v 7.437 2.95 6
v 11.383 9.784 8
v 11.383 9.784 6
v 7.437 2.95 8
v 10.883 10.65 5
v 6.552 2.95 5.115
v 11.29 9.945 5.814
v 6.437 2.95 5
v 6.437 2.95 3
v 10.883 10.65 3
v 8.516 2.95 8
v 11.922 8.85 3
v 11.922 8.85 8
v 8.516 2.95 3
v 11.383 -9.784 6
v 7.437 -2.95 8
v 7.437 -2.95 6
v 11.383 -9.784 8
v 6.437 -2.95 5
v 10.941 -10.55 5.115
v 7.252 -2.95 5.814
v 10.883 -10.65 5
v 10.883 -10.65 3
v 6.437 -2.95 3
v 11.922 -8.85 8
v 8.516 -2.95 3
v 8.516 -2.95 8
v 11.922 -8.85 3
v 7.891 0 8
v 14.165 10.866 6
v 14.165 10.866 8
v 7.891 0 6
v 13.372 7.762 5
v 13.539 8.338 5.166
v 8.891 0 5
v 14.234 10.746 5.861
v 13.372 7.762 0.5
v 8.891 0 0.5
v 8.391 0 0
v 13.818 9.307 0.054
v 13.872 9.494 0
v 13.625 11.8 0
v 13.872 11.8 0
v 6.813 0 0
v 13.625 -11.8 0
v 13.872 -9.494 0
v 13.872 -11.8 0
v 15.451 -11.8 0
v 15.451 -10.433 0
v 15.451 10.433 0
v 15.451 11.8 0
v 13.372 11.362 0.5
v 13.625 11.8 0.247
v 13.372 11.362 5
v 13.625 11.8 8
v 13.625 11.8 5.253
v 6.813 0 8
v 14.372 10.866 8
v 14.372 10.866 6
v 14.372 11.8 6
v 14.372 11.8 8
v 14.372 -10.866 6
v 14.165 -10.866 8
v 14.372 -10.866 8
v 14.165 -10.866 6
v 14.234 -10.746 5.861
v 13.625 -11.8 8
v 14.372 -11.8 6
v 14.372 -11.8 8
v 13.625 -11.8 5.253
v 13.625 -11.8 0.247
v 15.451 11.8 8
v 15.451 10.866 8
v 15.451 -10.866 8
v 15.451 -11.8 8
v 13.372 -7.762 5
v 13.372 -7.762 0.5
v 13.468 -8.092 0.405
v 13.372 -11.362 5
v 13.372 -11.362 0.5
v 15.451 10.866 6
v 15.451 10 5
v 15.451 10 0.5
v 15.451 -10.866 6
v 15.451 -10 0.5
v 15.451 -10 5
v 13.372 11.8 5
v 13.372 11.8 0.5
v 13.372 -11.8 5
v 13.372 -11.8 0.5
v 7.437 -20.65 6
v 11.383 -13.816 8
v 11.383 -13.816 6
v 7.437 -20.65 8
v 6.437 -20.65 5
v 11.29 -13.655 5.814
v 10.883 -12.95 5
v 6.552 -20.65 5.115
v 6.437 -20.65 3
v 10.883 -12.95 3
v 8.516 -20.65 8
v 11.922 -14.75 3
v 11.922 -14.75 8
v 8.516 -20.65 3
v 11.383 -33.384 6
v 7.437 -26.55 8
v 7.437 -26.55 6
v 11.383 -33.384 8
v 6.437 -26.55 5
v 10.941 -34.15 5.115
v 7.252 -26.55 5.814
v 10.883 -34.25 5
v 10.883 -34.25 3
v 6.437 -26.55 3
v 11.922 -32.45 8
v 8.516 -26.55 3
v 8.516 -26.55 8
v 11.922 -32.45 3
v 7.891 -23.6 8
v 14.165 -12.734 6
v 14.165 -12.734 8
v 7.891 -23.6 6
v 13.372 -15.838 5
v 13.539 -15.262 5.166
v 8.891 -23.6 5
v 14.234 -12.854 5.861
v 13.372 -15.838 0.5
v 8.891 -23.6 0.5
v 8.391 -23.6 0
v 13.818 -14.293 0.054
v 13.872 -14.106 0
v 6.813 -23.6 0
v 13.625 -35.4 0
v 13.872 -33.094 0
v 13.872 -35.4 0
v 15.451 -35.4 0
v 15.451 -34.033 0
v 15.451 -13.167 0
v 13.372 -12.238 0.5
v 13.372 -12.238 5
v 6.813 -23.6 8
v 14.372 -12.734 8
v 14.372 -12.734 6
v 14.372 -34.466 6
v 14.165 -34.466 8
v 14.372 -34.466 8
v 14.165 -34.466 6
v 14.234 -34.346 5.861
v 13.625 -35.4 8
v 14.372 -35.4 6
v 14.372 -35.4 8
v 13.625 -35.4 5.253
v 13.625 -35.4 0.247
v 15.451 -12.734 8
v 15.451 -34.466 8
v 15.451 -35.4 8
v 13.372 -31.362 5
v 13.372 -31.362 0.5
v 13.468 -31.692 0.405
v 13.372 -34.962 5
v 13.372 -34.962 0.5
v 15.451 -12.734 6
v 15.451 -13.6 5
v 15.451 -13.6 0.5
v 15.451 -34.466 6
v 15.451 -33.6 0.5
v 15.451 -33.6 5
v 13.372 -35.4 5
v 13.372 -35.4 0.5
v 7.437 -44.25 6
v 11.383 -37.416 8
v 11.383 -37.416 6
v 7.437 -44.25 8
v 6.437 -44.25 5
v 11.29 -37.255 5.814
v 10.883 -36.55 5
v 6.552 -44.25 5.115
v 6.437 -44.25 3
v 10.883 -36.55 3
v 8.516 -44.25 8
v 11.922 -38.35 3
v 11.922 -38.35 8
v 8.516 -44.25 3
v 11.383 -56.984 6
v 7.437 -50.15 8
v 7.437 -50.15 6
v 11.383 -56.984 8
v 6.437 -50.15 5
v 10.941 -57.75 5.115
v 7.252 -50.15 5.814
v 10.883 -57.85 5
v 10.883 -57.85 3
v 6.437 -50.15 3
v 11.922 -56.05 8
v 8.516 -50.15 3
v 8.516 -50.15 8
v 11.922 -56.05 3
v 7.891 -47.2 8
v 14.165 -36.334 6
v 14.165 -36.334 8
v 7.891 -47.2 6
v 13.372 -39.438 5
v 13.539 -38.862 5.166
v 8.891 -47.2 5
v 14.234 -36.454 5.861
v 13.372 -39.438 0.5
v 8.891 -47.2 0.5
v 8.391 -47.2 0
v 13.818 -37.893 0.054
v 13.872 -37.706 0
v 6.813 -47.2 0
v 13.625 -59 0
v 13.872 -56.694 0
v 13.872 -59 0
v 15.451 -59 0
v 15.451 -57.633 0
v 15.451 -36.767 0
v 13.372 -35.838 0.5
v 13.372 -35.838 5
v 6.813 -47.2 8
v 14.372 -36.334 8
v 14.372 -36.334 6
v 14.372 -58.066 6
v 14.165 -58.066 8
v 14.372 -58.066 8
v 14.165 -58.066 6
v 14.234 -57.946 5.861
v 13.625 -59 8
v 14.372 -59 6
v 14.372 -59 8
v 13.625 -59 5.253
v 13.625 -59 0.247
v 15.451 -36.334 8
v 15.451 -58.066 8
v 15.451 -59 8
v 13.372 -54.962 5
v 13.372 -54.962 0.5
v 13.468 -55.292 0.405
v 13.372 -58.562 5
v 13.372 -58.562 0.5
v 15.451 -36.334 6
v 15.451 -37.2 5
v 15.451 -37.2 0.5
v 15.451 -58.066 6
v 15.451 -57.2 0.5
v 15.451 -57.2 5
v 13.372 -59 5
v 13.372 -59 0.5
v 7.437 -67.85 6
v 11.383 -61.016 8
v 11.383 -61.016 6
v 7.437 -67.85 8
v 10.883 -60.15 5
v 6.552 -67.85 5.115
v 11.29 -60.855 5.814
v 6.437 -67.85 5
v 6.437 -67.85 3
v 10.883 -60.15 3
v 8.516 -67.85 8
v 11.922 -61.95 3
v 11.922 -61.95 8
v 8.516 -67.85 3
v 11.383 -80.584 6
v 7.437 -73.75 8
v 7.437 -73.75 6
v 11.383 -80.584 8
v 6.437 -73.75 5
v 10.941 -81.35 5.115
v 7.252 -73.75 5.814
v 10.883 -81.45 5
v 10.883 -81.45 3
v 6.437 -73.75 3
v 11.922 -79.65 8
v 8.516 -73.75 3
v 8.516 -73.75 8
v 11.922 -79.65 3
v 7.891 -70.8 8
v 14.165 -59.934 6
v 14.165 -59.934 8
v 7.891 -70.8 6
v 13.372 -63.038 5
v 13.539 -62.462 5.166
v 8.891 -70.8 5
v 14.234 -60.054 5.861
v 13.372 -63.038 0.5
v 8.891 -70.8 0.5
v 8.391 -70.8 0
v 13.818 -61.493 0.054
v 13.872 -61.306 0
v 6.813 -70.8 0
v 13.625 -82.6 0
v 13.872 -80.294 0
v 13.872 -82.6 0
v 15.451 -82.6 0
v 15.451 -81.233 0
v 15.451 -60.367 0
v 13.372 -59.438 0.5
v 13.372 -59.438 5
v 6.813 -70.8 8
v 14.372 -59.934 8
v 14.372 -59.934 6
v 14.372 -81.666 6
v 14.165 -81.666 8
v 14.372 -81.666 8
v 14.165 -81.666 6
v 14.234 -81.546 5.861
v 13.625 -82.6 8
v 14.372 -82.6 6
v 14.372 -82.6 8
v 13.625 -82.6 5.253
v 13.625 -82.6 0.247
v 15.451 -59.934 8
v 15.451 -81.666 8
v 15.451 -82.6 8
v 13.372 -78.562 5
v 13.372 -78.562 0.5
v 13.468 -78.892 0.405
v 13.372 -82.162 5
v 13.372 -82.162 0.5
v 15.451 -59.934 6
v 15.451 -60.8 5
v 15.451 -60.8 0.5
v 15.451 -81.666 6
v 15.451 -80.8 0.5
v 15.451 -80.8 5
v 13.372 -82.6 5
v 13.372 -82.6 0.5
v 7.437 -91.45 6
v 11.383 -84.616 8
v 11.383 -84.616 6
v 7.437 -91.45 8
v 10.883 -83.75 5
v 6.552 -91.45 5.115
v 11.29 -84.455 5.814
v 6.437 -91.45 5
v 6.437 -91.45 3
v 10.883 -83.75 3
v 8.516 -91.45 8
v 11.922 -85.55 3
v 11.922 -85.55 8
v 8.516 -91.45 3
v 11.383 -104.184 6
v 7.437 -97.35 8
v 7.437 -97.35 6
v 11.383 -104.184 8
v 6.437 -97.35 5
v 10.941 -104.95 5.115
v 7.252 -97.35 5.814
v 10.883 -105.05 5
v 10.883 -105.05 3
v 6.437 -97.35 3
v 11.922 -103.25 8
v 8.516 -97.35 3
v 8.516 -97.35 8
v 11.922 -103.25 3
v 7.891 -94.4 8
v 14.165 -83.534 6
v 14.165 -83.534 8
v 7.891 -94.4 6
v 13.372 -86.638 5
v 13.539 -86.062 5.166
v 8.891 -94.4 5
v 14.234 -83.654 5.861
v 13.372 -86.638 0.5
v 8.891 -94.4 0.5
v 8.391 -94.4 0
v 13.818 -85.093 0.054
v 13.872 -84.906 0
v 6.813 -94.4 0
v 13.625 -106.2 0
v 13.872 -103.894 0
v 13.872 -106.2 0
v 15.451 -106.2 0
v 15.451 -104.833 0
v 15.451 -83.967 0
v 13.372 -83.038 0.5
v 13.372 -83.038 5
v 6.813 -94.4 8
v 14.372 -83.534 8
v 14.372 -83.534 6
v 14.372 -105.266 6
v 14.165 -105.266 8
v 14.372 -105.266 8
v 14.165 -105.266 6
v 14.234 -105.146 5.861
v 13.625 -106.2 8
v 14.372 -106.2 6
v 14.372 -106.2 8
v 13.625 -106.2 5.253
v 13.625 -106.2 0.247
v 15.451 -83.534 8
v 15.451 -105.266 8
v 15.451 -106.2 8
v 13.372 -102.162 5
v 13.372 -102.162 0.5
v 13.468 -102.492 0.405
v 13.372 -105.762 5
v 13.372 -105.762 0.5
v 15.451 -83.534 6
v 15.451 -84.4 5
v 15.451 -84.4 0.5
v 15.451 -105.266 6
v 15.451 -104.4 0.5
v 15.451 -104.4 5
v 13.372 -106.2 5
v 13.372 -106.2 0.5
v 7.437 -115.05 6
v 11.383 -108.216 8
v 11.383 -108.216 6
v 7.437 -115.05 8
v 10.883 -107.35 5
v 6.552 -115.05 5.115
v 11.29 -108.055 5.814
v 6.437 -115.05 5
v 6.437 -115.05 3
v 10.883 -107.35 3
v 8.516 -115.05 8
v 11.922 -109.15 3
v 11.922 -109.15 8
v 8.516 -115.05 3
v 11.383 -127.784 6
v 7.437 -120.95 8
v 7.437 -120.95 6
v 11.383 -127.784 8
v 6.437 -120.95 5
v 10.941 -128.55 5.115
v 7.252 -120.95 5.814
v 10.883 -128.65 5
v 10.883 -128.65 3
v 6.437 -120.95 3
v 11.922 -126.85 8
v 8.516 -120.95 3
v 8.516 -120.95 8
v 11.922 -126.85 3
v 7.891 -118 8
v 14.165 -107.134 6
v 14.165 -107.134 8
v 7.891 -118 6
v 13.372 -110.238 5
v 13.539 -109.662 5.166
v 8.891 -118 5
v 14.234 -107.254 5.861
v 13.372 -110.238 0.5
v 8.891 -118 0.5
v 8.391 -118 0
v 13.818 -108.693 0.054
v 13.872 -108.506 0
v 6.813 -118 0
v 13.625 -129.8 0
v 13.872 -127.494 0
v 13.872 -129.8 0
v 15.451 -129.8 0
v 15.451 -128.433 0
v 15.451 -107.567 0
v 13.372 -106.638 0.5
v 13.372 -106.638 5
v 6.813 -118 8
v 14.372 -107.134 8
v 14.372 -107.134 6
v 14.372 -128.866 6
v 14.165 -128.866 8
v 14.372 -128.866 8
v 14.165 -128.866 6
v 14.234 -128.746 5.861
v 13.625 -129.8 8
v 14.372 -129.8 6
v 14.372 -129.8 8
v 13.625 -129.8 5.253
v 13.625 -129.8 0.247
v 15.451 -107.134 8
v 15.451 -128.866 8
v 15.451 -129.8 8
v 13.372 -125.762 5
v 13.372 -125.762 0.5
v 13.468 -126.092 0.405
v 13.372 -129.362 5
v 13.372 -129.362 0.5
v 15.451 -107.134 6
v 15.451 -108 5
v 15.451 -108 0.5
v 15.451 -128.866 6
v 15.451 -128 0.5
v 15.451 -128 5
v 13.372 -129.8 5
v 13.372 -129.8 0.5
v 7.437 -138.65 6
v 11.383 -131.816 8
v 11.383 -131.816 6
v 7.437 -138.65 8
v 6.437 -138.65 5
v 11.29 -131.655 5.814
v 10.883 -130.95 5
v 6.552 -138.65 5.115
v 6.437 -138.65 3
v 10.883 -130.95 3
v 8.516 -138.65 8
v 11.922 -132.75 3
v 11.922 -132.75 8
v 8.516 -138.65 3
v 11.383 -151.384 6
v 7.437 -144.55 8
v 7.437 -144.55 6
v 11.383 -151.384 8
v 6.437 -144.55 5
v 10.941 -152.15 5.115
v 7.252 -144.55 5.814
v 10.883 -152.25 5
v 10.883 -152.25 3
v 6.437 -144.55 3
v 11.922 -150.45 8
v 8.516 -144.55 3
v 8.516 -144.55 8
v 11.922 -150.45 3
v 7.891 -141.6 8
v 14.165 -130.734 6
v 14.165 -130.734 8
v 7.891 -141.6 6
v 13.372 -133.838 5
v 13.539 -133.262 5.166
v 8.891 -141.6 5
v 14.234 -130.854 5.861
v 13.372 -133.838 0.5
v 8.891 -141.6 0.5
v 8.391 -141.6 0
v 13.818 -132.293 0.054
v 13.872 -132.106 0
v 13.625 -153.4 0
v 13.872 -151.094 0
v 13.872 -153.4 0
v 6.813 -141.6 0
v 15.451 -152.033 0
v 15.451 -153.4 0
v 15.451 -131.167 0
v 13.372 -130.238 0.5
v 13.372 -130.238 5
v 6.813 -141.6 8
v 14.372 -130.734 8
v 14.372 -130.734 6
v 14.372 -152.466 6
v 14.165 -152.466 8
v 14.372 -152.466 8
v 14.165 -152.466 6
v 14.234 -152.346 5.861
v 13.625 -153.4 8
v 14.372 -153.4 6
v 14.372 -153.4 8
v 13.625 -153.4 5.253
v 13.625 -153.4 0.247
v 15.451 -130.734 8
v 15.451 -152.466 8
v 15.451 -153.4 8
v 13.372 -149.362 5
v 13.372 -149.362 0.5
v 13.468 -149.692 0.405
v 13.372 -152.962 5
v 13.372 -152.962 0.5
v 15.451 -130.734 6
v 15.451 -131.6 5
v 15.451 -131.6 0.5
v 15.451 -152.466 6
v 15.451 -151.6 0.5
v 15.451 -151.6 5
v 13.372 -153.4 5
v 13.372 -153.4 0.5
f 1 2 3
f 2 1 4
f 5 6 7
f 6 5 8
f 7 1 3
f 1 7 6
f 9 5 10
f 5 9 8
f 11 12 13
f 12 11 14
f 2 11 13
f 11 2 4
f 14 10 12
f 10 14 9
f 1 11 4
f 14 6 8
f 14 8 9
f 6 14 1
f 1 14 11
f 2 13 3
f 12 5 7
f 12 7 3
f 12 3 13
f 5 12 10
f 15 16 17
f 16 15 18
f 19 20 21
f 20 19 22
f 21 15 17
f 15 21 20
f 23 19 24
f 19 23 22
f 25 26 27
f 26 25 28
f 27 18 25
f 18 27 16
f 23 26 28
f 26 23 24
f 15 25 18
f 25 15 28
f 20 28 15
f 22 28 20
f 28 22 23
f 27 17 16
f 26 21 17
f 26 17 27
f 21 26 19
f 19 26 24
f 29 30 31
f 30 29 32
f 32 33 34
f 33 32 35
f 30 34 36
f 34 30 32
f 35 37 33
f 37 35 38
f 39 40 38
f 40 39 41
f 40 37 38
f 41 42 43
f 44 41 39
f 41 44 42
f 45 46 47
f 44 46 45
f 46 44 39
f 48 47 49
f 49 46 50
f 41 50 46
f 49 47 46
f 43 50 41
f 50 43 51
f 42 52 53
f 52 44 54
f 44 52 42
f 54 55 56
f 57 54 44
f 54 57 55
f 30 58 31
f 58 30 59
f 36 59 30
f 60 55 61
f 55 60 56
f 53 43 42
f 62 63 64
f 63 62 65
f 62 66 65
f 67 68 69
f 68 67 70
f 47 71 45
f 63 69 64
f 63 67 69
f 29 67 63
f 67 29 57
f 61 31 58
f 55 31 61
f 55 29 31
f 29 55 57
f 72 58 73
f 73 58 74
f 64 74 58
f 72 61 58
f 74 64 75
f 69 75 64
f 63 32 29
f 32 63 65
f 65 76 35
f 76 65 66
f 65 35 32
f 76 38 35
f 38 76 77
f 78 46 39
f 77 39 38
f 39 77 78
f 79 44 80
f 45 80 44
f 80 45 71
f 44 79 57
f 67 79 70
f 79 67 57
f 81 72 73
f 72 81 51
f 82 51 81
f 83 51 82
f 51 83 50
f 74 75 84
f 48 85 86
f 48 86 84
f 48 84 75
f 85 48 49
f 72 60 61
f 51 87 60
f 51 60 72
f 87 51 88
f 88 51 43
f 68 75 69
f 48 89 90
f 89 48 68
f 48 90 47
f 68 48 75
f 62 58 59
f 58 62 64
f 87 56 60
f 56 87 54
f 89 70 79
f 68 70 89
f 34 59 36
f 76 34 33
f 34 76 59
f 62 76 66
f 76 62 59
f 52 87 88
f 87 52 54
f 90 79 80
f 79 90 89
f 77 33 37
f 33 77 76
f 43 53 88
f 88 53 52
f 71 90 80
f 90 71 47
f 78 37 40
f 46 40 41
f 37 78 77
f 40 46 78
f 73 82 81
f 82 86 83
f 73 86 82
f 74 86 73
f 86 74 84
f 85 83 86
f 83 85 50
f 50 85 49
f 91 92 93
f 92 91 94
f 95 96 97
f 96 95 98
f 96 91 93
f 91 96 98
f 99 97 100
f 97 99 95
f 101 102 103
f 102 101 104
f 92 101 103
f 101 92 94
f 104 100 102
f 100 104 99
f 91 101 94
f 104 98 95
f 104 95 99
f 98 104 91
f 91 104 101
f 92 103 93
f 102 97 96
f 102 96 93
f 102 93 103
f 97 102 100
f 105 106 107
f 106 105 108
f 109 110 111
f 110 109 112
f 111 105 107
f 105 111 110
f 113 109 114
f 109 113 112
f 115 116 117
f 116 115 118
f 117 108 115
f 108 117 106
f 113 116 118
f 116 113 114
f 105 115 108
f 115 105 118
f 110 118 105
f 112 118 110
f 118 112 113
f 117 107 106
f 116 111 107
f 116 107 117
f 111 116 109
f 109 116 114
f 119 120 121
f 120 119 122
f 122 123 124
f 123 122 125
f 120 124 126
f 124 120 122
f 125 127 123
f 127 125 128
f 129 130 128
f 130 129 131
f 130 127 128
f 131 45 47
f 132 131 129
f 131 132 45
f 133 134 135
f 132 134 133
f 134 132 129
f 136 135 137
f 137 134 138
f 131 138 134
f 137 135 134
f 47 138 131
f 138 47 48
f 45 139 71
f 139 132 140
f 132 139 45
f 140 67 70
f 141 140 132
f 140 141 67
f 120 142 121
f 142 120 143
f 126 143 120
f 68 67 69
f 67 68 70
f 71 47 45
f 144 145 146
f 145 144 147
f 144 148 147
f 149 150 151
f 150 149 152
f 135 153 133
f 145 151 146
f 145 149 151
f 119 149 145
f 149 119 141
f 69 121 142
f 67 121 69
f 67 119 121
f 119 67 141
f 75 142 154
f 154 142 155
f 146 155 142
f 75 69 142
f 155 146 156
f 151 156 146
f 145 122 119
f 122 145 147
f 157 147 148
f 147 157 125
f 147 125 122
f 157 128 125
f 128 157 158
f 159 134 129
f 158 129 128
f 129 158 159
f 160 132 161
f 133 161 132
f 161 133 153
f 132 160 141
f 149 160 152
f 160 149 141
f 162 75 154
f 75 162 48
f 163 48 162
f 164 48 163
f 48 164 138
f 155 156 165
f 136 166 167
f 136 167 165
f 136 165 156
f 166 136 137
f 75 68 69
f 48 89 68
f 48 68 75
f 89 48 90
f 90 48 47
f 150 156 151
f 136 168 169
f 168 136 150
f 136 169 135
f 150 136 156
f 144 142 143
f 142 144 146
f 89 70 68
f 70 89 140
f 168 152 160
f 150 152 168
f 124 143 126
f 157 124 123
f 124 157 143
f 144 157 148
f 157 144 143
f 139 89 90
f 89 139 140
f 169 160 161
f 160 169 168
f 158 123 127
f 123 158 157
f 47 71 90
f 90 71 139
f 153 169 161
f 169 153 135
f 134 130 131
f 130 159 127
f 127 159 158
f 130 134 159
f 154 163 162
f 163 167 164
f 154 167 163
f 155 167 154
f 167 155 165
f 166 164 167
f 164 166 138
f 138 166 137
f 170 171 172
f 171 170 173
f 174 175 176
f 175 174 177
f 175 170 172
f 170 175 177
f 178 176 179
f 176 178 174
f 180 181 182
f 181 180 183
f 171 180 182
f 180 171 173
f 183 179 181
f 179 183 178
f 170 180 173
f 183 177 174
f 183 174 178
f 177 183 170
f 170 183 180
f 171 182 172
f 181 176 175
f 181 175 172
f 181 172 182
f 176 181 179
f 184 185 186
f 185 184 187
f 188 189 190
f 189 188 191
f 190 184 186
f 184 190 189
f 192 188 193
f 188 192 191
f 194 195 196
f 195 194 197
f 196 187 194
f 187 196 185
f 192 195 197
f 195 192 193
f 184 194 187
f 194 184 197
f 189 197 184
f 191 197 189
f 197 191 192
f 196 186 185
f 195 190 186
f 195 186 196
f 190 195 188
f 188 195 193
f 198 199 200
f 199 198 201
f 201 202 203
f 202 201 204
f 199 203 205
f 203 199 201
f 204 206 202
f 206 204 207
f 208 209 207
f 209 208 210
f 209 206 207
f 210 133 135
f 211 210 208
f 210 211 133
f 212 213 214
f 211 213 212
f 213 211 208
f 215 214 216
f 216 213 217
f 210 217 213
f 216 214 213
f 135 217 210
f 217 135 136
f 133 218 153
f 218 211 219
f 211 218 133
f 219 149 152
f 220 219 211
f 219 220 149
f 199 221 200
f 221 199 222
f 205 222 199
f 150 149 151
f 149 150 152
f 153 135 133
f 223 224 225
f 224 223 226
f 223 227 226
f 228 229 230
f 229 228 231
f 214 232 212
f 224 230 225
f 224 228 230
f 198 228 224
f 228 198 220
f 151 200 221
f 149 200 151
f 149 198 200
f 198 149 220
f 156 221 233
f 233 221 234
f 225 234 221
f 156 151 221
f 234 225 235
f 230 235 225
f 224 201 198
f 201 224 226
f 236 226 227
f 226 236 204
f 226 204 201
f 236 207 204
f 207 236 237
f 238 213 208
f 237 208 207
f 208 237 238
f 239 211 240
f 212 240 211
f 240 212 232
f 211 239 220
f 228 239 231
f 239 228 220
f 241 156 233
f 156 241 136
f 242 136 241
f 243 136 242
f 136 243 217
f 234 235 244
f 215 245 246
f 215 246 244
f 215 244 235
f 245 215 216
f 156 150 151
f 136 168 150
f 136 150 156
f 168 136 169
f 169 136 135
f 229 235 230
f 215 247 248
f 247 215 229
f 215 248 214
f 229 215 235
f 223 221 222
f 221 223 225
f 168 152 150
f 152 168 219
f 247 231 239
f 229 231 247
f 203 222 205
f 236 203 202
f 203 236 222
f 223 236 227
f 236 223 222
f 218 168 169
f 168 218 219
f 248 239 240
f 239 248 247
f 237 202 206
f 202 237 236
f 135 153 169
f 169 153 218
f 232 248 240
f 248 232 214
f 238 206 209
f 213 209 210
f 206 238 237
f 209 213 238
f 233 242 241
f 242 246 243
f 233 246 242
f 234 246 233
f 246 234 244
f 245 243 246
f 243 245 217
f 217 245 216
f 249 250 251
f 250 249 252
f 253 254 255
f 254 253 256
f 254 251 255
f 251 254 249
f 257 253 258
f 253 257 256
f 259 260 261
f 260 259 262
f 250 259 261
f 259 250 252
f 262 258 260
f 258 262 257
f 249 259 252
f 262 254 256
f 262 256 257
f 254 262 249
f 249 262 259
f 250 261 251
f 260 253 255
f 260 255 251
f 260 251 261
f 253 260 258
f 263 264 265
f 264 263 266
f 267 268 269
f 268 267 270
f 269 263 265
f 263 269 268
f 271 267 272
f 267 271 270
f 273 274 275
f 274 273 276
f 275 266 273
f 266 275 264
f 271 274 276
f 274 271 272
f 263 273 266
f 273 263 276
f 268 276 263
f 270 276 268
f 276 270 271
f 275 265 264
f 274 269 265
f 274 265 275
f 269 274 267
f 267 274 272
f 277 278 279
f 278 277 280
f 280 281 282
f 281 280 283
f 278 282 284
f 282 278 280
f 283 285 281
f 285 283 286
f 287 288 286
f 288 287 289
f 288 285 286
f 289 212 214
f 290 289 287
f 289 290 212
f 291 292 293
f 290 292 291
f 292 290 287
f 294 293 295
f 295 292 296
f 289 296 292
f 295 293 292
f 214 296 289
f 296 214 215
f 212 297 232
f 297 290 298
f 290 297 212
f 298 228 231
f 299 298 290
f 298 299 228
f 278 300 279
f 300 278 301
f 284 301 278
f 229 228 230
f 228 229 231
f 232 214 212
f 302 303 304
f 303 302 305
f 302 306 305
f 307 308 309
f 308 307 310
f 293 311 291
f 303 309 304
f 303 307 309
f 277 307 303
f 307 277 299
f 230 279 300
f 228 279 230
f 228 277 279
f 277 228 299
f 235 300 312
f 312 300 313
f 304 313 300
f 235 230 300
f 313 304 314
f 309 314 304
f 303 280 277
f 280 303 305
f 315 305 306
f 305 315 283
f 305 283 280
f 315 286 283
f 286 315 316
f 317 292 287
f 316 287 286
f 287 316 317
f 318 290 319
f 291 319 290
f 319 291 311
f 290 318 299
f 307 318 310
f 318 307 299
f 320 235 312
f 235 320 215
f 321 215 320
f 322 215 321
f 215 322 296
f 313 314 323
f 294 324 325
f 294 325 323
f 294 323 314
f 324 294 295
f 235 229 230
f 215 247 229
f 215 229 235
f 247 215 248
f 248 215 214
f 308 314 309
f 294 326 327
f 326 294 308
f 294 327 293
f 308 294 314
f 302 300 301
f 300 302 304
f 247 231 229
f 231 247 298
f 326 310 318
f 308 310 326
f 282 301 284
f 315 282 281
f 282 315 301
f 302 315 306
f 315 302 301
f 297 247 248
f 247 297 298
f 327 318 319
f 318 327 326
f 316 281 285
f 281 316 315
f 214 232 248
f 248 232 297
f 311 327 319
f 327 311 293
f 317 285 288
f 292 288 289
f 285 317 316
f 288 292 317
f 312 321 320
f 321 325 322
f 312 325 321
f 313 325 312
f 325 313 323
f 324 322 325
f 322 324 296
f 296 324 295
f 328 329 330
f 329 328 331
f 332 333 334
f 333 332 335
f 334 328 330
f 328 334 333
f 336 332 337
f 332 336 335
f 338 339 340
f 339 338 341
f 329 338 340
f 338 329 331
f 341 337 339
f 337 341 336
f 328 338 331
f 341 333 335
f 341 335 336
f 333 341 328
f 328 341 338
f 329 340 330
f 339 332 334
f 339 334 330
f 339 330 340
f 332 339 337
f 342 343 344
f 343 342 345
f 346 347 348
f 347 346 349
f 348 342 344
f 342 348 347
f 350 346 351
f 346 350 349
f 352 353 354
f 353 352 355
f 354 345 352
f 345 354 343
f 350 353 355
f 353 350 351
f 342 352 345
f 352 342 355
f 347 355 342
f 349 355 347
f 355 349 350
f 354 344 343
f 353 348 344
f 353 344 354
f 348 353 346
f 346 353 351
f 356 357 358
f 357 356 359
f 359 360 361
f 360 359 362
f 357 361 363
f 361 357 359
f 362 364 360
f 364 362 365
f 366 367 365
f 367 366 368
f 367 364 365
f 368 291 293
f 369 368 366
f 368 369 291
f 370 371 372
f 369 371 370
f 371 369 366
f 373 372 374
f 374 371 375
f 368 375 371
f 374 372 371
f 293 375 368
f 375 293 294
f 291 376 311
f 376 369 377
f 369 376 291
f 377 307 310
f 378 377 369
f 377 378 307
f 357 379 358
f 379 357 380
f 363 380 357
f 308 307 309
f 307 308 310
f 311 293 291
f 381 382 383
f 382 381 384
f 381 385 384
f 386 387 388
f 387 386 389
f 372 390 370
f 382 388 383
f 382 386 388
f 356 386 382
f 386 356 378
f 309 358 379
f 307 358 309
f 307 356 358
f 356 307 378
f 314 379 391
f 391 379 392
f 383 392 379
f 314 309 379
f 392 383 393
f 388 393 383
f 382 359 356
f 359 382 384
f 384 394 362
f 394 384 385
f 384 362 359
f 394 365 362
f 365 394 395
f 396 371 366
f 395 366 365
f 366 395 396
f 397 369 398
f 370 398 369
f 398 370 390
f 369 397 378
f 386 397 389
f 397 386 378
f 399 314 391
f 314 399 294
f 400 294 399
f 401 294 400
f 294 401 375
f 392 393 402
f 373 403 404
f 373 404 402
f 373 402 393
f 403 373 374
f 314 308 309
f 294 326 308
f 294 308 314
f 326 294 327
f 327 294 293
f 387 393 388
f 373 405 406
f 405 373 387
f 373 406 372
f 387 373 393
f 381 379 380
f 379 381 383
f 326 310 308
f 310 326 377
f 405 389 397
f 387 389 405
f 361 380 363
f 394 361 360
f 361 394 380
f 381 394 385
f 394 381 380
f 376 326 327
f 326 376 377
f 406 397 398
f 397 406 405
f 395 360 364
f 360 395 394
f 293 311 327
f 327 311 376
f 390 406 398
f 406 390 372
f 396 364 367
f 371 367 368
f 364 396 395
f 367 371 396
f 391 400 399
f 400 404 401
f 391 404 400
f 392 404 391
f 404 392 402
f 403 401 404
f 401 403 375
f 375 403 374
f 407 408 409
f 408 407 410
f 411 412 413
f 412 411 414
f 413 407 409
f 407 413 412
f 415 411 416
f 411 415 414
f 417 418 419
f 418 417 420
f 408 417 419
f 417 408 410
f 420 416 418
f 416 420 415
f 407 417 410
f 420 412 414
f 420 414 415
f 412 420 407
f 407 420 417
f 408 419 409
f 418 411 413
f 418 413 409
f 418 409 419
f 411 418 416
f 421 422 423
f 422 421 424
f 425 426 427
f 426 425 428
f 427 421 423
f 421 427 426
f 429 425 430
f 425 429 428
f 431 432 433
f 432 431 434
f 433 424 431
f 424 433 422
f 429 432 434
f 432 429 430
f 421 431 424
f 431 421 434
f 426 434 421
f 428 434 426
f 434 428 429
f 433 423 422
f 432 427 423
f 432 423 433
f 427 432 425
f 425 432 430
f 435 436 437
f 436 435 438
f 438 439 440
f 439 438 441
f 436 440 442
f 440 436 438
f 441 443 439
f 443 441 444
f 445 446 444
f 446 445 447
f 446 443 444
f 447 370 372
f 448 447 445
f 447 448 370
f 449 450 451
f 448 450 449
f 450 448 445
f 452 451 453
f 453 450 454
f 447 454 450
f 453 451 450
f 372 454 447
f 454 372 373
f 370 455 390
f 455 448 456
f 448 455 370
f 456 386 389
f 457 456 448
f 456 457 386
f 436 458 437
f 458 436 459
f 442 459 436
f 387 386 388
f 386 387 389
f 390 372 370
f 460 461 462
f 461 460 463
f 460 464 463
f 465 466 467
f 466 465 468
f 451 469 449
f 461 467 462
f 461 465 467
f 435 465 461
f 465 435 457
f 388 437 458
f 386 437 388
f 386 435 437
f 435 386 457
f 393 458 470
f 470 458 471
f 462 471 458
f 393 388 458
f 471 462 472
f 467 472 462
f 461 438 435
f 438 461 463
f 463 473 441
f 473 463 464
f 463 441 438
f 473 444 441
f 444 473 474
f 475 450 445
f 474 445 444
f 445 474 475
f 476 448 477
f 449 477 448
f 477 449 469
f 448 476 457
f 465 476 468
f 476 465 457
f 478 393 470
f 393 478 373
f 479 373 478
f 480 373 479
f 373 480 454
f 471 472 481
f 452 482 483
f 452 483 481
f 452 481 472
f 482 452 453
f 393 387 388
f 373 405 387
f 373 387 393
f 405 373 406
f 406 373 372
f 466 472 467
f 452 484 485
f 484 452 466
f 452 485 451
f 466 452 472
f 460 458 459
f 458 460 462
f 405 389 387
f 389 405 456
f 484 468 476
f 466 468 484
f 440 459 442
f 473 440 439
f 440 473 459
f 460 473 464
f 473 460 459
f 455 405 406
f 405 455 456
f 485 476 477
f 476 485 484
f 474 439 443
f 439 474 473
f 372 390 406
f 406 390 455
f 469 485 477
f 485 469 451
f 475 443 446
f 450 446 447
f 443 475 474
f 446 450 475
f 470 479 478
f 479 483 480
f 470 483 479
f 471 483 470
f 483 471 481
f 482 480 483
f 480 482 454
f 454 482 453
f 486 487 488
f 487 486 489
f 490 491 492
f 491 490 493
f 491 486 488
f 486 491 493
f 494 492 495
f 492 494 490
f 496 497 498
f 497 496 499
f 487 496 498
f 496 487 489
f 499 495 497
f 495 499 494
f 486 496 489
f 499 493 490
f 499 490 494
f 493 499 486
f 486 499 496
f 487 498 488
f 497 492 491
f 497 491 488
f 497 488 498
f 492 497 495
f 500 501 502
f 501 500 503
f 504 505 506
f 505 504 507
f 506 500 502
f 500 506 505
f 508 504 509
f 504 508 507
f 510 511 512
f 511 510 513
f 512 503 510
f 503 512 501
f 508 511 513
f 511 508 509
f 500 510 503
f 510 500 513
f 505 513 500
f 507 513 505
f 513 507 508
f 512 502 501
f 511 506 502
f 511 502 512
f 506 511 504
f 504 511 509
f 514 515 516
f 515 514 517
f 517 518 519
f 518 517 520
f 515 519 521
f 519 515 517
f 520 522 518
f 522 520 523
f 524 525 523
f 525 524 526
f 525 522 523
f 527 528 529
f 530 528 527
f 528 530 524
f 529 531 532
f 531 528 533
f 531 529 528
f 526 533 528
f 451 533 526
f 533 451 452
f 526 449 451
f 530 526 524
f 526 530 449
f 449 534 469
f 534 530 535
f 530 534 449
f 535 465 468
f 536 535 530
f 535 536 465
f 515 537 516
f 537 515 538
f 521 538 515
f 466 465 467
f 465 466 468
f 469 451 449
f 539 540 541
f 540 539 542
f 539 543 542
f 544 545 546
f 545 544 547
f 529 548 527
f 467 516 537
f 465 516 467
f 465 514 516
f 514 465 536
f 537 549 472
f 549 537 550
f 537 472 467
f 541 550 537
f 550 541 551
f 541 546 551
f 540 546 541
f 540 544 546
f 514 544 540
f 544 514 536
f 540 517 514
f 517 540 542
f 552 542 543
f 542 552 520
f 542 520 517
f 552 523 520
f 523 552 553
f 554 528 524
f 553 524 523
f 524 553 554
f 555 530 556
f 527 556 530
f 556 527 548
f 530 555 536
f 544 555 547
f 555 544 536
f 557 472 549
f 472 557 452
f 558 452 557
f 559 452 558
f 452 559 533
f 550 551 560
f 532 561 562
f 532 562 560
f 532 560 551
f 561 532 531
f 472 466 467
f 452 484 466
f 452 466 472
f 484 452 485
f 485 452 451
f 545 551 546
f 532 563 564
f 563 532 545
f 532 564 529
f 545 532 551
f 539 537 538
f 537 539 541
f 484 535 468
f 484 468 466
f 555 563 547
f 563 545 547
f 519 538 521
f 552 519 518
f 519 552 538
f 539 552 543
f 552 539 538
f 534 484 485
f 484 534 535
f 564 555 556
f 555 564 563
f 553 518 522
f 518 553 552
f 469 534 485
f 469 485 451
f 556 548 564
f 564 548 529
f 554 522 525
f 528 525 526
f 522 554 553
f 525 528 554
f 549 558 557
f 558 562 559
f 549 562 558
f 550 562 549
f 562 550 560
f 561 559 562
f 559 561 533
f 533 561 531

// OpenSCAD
$fn = 50;

radius = 13.6;
diameter =  radius * 2;

h_inner = 10;
r_inner = h_inner * 2/sqrt(3);

h_outer = 10+1.8;
r_outer = h_outer * 2/sqrt(3);


h_thin = 10+1;
r_thin = h_thin * 2/sqrt(3);

total_height = 8;

small_value = 0.1;


clips_height = 5;
clips_offset = 0.5;
clips_side_offset = 0.00;


module basic_polygon() {
  polygon([[r_outer, total_height], [r_outer, 0], [r_inner+0.5, 0], [r_inner, 0.5], 
        [r_inner, total_height-3], [r_inner+1, total_height-2], [r_inner+1,total_height]]);    
}

module basic_model() {
  rotate_extrude($fn=6) {
      basic_polygon();
  }
}


module panel_with_clips(pin_1=false, pin_2=false, pin_3=false, pin_4=false, pin_5=false, pin_6=false, slot_1=false, slot_2=false, slot_3=false, slot_4=false, slot_5=false, slot_6=false) {

  difference() {
    basic_model();

    if (slot_1) {
      rotate([0, 0, 0])
        translate([0, -h_outer*2, total_height - (clips_height+clips_offset)/2])
          linear_extrude(height=clips_height+clips_offset, center=true)
            polygon([[clips_side_offset, h_outer/2], [-clips_side_offset, h_outer/2], [-r_outer/2-clips_side_offset, h_outer*1.5], [r_outer/2+clips_side_offset, h_outer*1.5]]);
    }

    if (slot_2) {
      rotate([0, 0, 60])
        translate([0, -h_outer*2, total_height - (clips_height+clips_offset)/2])
          linear_extrude(height=clips_height+clips_offset, center=true)
            polygon([[clips_side_offset, h_outer/2], [-clips_side_offset, h_outer/2], [-r_outer/2-clips_side_offset, h_outer*1.5], [r_outer/2+clips_side_offset, h_outer*1.5]]);
    }



    if (slot_3) {
      rotate([0, 0, 120])
        translate([0, -h_outer*2, total_height - (clips_height+clips_offset)/2])
          linear_extrude(height=clips_height+clips_offset, center=true)
            polygon([[clips_side_offset, h_outer/2], [-clips_side_offset, h_outer/2], [-r_outer/2-clips_side_offset, h_outer*1.5], [r_outer/2+clips_side_offset, h_outer*1.5]]);
    }

    if (slot_4) {
      rotate([0, 0, 180])
        translate([0, -h_outer*2, total_height - (clips_height+clips_offset)/2])
          linear_extrude(height=clips_height+clips_offset, center=true)
            polygon([[clips_side_offset, h_outer/2], [-clips_side_offset, h_outer/2], [-r_outer/2-clips_side_offset, h_outer*1.5], [r_outer/2+clips_side_offset, h_outer*1.5]]);
    }

    if (slot_5) {
      rotate([0, 0, 240])
        translate([0, -h_outer*2, total_height - (clips_height+clips_offset)/2])
          linear_extrude(height=clips_height+clips_offset, center=true)
            polygon([[clips_side_offset, h_outer/2], [-clips_side_offset, h_outer/2], [-r_outer/2-clips_side_offset, h_outer*1.5], [r_outer/2+clips_side_offset, h_outer*1.5]]);
    }

    if (slot_6) {
      rotate([0, 0, 300])
        translate([0, -h_outer*2, total_height - (clips_height+clips_offset)/2])
          linear_extrude(height=clips_height+clips_offset, center=true)
            polygon([[clips_side_offset, h_outer/2], [-clips_side_offset, h_outer/2], [-r_outer/2-clips_side_offset, h_outer*1.5], [r_outer/2+clips_side_offset, h_outer*1.5]]);
    }
  }


  if (pin_1) {
    intersection() {
      translate([0,-h_outer*2, 0])
        basic_model();
      translate([0, 0, total_height - clips_height/2]) {
        rotate([0, 0, -180])  
          linear_extrude(height=clips_height, center=true)
            polygon([[0, h_outer/2], [-r_outer/2, h_outer*1.5], [r_outer/2, h_outer*1.5]]);  
      }
    }
  }

  if (pin_2) {
    intersection() {
      translate([r_outer*1.5,-h_outer, 0])
        basic_model();
      translate([0, 0, total_height - clips_height/2]) {
        rotate([0, 0, -120])  
          linear_extrude(height=clips_height, center=true)
            polygon([[0, h_outer/2], [-r_outer/2, h_outer*1.5], [r_outer/2, h_outer*1.5]]);  
      }
    }
  }


  if (pin_3) {
    intersection() {
      translate([r_outer*1.5,h_outer, 0])
        basic_model();
      translate([0, 0, total_height - clips_height/2]) {
        rotate([0, 0, -60])  
          linear_extrude(height=clips_height, center=true)
            polygon([[0, h_outer/2], [-r_outer/2, h_outer*1.5], [r_outer/2, h_outer*1.5]]);  
      }
    }
  }

  if (pin_4) {
    intersection() {
      translate([0, h_outer*2, 0])
        basic_model();

      translate([0, 0, total_height - clips_height/2]) {
        linear_extrude(height=clips_height, center=true)
          polygon([[0, h_outer/2], [-r_outer/2, h_outer*1.5], [r_outer/2, h_outer*1.5]]);
      }  
    }
  }

  if (pin_5) {
    intersection() {
      translate([-r_outer*1.5,h_outer, 0])
        basic_model();
      translate([0, 0, total_height - clips_height/2]) {
        rotate([0, 0, 60])  
          linear_extrude(height=clips_height, center=true)
            polygon([[0, h_outer/2], [-r_outer/2, h_outer*1.5], [r_outer/2, h_outer*1.5]]);  
      }
    }
  }
  
  if (pin_6) {
    intersection() {
      translate([-r_outer*1.5, -h_outer, 0])
        basic_model();

      translate([0, 0, total_height - clips_height/2]) {
        rotate([0, 0, 120])  
          linear_extrude(height=clips_height, center=true)
            polygon([[0, h_outer/2], [-r_outer/2, h_outer*1.5], [r_outer/2, h_outer*1.5]]);  
      }
    }
  }
}

// end honeycomb_element.scad




module perimeter_left_item(pin_5=true, pin_6=true) {
  difference() {
      translate([r_outer * 1.5, 0, 0])
        panel_with_clips(pin_6=pin_6, pin_5=pin_5);
      translate([50+r_outer * 1.5-r_outer/2 + (r_outer-h_outer), 0, 0])
        cube([100, 100, 100], center = true);
  }
  translate([0 + r_outer-h_outer, 0, 0])
    rotate([90, 0, 0])
      linear_extrude(height = h_outer * 2, center=true)
        basic_polygon();
}



module perimeter_left() {  
    
    for (i = [0:6]) {       
      translate([0, -h_outer*2*i, 0])
        perimeter_left_item();   
    }
}



perimeter_left();
